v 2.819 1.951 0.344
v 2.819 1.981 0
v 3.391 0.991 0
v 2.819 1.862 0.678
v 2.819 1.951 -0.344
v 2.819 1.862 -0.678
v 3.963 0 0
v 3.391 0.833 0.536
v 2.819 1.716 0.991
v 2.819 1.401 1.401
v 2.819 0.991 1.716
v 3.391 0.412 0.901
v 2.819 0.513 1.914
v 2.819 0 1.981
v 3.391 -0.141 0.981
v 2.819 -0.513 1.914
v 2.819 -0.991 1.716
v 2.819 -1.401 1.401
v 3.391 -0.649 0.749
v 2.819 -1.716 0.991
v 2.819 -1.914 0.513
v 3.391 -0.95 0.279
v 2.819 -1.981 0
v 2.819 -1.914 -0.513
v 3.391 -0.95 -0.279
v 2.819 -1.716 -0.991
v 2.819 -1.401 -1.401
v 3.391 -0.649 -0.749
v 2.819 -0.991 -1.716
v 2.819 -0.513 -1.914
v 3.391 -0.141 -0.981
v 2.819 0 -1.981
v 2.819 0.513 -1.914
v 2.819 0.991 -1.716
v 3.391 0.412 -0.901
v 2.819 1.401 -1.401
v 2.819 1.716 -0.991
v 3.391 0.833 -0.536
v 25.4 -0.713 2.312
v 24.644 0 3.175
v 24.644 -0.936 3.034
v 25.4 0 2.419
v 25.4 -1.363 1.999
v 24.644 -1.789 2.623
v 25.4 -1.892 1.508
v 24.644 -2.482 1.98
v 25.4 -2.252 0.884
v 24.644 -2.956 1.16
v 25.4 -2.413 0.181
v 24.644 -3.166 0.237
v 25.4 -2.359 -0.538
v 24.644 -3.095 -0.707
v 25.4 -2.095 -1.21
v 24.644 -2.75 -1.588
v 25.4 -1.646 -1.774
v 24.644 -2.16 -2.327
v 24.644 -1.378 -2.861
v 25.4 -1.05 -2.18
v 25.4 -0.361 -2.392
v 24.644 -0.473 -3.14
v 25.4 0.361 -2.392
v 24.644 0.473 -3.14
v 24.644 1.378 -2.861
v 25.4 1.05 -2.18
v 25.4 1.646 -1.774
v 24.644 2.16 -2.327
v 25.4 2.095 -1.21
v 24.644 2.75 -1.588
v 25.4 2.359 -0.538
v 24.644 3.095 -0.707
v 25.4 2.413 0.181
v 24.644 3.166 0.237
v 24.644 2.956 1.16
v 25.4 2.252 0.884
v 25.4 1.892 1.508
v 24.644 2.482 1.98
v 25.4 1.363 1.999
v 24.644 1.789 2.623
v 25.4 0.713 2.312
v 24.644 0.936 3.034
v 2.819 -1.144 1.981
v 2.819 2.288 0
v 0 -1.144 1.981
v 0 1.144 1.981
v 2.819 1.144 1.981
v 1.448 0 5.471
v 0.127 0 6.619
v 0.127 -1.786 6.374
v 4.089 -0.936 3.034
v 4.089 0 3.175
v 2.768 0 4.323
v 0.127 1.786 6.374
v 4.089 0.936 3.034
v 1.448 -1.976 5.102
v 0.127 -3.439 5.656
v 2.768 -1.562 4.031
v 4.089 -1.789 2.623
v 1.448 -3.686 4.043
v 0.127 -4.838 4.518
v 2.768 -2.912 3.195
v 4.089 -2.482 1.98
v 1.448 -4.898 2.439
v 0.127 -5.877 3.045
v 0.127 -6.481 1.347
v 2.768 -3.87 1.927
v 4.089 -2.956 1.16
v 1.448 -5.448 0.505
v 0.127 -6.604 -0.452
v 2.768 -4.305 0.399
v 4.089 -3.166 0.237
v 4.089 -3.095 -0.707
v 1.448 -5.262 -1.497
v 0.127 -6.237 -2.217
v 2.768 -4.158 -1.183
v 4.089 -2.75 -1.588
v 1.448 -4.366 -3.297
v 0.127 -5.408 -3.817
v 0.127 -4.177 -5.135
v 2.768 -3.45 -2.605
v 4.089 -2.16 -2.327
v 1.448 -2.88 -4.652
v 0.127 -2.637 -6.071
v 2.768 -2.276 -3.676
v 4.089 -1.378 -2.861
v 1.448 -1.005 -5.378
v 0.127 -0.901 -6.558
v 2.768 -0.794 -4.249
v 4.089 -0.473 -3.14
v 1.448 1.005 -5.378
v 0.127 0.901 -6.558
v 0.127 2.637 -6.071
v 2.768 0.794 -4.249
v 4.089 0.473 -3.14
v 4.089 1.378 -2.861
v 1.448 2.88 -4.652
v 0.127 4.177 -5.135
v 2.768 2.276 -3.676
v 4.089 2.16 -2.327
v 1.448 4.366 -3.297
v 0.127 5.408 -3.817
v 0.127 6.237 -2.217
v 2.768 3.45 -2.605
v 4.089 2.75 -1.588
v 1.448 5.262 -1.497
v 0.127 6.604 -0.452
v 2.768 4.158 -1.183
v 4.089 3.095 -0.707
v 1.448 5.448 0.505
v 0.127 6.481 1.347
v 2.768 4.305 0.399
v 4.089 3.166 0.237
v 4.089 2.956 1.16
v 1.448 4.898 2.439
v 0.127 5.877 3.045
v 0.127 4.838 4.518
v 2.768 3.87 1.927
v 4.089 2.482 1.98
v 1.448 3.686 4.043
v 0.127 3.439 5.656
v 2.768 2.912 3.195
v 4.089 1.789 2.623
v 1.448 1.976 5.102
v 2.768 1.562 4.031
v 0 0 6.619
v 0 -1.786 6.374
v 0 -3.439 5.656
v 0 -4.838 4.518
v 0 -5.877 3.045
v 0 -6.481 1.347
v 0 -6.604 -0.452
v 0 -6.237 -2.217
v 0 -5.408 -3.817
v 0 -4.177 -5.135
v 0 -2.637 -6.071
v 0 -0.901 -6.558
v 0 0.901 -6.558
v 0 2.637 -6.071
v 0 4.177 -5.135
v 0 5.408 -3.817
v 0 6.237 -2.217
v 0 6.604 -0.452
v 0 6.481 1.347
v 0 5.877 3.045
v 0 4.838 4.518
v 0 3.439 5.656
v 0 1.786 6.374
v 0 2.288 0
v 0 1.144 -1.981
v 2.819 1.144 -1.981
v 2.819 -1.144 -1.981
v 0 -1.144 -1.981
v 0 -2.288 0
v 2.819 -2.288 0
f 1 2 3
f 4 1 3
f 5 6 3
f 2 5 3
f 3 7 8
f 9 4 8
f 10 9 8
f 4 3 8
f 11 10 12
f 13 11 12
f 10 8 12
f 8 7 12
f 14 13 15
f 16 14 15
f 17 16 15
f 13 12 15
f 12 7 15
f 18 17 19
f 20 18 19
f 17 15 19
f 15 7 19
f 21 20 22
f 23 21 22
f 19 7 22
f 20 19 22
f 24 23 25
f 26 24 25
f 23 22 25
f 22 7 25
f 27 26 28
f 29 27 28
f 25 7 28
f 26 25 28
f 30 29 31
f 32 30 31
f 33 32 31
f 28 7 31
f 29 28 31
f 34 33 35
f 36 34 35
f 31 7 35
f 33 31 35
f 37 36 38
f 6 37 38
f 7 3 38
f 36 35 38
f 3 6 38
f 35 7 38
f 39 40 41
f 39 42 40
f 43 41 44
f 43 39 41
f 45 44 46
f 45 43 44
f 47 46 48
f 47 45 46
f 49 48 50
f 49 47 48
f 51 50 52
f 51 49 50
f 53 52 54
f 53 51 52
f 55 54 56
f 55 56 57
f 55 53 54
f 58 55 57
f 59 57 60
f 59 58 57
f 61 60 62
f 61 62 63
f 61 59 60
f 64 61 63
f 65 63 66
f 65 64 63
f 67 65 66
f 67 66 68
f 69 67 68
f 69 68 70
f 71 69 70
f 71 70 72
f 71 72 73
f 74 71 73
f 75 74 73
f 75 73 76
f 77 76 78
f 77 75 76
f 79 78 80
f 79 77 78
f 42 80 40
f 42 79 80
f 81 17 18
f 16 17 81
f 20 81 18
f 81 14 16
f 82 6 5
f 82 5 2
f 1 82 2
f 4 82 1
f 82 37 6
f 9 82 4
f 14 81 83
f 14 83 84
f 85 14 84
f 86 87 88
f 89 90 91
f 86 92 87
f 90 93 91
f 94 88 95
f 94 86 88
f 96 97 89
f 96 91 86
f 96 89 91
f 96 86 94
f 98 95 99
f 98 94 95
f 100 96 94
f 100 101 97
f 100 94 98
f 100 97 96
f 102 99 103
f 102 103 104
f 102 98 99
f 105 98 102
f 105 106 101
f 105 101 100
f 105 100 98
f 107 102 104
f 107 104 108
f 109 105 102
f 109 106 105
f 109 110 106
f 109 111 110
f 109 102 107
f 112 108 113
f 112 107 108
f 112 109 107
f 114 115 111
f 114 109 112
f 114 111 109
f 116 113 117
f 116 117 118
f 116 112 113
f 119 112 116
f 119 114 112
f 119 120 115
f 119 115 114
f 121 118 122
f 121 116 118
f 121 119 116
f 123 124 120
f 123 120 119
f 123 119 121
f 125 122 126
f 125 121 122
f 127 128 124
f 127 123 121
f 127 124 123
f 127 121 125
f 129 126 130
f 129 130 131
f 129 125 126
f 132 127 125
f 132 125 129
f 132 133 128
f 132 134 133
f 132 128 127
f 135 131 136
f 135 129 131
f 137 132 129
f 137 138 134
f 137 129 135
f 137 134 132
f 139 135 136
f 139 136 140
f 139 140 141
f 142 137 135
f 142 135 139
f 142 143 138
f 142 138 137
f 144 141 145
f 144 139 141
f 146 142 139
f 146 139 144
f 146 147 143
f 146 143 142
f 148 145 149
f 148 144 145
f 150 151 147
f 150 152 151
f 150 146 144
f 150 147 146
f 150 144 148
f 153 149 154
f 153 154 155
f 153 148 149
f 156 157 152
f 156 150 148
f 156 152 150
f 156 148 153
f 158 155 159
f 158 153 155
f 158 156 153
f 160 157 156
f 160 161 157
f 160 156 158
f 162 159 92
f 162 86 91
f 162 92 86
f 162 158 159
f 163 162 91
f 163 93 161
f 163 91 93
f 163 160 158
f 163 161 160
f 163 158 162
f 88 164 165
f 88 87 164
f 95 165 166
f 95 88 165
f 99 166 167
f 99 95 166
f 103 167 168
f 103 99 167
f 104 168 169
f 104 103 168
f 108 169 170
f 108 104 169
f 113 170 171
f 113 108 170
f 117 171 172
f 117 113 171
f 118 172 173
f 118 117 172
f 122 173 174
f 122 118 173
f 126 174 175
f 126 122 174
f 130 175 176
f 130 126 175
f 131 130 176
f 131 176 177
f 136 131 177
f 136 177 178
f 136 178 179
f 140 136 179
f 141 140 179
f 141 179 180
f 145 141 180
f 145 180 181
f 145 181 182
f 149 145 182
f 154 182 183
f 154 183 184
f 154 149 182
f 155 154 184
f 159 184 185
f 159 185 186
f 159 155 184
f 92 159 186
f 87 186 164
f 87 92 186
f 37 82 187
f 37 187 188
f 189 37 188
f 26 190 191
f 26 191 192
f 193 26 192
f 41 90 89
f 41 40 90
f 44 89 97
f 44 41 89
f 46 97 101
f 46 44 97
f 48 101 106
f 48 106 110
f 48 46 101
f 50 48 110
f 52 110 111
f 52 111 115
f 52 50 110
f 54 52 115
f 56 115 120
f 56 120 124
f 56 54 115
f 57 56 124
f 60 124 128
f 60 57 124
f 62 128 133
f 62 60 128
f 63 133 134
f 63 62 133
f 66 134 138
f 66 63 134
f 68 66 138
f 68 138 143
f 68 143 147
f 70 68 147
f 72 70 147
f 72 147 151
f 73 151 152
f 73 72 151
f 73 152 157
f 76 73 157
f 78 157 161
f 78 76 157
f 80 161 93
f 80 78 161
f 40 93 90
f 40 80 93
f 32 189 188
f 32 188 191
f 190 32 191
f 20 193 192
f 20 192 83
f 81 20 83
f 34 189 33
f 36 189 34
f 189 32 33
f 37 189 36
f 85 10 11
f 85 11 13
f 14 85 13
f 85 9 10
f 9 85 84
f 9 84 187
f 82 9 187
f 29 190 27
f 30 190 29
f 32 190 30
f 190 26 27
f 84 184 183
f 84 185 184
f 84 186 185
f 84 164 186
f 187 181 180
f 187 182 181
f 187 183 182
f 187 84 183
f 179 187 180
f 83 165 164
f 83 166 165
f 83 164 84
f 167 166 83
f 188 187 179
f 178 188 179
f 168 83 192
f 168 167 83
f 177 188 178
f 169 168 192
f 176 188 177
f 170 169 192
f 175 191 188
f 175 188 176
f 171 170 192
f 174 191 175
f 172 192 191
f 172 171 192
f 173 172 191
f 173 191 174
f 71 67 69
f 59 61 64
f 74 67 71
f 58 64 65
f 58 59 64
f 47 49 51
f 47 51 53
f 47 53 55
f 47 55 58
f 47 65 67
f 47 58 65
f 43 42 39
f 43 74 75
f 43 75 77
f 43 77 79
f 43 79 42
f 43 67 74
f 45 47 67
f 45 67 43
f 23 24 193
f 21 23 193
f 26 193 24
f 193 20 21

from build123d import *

# Parameters (mm, degrees)
HEX_START   = -2.8194
HEX_2_DEPTH = 2.8194


with BuildPart() as part:
    # BodySke → BaseBody (revolve)
    with BuildSketch(Plane.XY, mode=Mode.PRIVATE) as basebody_sk:
        Polygon((0, 0), (0, 6.61924), (0.127, 6.61924), (4.089144883, 3.175), (24.64435, 3.175), (25.4, 2.41935), (25.4, 0), align=None)
    revolve(basebody_sk.sketch.rotate(Axis((0, 0, 0), (1, 0, 0)), 90), axis=Axis((0, 0, 0), (1, 0, 0)))

    # Hex 2: read off the stored shape, not the designer's step
    # Hex 2 outline → Hex 2 (cut)
    with BuildSketch(Plane.ZY.offset(HEX_START)):
        Polygon((-1.9812, -1.143846353), (0, -2.287692707), (1.9812, -1.143846353), (1.9812, 1.143846353), (0, 2.287692707), (-1.9812, 1.143846353), align=None)
    extrude(amount=HEX_2_DEPTH, mode=Mode.SUBTRACT)

    # Hex 2 2 outline → Hex 2 2 (revolve, cut)
    with BuildSketch(Plane.YX):
        Polygon((1.9812, 2.8194), (0, 3.963246353), (0, 2.8194), align=None)
    revolve(axis=Axis((0, 0, 0), (1, 0, 0)), mode=Mode.SUBTRACT)


solid = part.part
